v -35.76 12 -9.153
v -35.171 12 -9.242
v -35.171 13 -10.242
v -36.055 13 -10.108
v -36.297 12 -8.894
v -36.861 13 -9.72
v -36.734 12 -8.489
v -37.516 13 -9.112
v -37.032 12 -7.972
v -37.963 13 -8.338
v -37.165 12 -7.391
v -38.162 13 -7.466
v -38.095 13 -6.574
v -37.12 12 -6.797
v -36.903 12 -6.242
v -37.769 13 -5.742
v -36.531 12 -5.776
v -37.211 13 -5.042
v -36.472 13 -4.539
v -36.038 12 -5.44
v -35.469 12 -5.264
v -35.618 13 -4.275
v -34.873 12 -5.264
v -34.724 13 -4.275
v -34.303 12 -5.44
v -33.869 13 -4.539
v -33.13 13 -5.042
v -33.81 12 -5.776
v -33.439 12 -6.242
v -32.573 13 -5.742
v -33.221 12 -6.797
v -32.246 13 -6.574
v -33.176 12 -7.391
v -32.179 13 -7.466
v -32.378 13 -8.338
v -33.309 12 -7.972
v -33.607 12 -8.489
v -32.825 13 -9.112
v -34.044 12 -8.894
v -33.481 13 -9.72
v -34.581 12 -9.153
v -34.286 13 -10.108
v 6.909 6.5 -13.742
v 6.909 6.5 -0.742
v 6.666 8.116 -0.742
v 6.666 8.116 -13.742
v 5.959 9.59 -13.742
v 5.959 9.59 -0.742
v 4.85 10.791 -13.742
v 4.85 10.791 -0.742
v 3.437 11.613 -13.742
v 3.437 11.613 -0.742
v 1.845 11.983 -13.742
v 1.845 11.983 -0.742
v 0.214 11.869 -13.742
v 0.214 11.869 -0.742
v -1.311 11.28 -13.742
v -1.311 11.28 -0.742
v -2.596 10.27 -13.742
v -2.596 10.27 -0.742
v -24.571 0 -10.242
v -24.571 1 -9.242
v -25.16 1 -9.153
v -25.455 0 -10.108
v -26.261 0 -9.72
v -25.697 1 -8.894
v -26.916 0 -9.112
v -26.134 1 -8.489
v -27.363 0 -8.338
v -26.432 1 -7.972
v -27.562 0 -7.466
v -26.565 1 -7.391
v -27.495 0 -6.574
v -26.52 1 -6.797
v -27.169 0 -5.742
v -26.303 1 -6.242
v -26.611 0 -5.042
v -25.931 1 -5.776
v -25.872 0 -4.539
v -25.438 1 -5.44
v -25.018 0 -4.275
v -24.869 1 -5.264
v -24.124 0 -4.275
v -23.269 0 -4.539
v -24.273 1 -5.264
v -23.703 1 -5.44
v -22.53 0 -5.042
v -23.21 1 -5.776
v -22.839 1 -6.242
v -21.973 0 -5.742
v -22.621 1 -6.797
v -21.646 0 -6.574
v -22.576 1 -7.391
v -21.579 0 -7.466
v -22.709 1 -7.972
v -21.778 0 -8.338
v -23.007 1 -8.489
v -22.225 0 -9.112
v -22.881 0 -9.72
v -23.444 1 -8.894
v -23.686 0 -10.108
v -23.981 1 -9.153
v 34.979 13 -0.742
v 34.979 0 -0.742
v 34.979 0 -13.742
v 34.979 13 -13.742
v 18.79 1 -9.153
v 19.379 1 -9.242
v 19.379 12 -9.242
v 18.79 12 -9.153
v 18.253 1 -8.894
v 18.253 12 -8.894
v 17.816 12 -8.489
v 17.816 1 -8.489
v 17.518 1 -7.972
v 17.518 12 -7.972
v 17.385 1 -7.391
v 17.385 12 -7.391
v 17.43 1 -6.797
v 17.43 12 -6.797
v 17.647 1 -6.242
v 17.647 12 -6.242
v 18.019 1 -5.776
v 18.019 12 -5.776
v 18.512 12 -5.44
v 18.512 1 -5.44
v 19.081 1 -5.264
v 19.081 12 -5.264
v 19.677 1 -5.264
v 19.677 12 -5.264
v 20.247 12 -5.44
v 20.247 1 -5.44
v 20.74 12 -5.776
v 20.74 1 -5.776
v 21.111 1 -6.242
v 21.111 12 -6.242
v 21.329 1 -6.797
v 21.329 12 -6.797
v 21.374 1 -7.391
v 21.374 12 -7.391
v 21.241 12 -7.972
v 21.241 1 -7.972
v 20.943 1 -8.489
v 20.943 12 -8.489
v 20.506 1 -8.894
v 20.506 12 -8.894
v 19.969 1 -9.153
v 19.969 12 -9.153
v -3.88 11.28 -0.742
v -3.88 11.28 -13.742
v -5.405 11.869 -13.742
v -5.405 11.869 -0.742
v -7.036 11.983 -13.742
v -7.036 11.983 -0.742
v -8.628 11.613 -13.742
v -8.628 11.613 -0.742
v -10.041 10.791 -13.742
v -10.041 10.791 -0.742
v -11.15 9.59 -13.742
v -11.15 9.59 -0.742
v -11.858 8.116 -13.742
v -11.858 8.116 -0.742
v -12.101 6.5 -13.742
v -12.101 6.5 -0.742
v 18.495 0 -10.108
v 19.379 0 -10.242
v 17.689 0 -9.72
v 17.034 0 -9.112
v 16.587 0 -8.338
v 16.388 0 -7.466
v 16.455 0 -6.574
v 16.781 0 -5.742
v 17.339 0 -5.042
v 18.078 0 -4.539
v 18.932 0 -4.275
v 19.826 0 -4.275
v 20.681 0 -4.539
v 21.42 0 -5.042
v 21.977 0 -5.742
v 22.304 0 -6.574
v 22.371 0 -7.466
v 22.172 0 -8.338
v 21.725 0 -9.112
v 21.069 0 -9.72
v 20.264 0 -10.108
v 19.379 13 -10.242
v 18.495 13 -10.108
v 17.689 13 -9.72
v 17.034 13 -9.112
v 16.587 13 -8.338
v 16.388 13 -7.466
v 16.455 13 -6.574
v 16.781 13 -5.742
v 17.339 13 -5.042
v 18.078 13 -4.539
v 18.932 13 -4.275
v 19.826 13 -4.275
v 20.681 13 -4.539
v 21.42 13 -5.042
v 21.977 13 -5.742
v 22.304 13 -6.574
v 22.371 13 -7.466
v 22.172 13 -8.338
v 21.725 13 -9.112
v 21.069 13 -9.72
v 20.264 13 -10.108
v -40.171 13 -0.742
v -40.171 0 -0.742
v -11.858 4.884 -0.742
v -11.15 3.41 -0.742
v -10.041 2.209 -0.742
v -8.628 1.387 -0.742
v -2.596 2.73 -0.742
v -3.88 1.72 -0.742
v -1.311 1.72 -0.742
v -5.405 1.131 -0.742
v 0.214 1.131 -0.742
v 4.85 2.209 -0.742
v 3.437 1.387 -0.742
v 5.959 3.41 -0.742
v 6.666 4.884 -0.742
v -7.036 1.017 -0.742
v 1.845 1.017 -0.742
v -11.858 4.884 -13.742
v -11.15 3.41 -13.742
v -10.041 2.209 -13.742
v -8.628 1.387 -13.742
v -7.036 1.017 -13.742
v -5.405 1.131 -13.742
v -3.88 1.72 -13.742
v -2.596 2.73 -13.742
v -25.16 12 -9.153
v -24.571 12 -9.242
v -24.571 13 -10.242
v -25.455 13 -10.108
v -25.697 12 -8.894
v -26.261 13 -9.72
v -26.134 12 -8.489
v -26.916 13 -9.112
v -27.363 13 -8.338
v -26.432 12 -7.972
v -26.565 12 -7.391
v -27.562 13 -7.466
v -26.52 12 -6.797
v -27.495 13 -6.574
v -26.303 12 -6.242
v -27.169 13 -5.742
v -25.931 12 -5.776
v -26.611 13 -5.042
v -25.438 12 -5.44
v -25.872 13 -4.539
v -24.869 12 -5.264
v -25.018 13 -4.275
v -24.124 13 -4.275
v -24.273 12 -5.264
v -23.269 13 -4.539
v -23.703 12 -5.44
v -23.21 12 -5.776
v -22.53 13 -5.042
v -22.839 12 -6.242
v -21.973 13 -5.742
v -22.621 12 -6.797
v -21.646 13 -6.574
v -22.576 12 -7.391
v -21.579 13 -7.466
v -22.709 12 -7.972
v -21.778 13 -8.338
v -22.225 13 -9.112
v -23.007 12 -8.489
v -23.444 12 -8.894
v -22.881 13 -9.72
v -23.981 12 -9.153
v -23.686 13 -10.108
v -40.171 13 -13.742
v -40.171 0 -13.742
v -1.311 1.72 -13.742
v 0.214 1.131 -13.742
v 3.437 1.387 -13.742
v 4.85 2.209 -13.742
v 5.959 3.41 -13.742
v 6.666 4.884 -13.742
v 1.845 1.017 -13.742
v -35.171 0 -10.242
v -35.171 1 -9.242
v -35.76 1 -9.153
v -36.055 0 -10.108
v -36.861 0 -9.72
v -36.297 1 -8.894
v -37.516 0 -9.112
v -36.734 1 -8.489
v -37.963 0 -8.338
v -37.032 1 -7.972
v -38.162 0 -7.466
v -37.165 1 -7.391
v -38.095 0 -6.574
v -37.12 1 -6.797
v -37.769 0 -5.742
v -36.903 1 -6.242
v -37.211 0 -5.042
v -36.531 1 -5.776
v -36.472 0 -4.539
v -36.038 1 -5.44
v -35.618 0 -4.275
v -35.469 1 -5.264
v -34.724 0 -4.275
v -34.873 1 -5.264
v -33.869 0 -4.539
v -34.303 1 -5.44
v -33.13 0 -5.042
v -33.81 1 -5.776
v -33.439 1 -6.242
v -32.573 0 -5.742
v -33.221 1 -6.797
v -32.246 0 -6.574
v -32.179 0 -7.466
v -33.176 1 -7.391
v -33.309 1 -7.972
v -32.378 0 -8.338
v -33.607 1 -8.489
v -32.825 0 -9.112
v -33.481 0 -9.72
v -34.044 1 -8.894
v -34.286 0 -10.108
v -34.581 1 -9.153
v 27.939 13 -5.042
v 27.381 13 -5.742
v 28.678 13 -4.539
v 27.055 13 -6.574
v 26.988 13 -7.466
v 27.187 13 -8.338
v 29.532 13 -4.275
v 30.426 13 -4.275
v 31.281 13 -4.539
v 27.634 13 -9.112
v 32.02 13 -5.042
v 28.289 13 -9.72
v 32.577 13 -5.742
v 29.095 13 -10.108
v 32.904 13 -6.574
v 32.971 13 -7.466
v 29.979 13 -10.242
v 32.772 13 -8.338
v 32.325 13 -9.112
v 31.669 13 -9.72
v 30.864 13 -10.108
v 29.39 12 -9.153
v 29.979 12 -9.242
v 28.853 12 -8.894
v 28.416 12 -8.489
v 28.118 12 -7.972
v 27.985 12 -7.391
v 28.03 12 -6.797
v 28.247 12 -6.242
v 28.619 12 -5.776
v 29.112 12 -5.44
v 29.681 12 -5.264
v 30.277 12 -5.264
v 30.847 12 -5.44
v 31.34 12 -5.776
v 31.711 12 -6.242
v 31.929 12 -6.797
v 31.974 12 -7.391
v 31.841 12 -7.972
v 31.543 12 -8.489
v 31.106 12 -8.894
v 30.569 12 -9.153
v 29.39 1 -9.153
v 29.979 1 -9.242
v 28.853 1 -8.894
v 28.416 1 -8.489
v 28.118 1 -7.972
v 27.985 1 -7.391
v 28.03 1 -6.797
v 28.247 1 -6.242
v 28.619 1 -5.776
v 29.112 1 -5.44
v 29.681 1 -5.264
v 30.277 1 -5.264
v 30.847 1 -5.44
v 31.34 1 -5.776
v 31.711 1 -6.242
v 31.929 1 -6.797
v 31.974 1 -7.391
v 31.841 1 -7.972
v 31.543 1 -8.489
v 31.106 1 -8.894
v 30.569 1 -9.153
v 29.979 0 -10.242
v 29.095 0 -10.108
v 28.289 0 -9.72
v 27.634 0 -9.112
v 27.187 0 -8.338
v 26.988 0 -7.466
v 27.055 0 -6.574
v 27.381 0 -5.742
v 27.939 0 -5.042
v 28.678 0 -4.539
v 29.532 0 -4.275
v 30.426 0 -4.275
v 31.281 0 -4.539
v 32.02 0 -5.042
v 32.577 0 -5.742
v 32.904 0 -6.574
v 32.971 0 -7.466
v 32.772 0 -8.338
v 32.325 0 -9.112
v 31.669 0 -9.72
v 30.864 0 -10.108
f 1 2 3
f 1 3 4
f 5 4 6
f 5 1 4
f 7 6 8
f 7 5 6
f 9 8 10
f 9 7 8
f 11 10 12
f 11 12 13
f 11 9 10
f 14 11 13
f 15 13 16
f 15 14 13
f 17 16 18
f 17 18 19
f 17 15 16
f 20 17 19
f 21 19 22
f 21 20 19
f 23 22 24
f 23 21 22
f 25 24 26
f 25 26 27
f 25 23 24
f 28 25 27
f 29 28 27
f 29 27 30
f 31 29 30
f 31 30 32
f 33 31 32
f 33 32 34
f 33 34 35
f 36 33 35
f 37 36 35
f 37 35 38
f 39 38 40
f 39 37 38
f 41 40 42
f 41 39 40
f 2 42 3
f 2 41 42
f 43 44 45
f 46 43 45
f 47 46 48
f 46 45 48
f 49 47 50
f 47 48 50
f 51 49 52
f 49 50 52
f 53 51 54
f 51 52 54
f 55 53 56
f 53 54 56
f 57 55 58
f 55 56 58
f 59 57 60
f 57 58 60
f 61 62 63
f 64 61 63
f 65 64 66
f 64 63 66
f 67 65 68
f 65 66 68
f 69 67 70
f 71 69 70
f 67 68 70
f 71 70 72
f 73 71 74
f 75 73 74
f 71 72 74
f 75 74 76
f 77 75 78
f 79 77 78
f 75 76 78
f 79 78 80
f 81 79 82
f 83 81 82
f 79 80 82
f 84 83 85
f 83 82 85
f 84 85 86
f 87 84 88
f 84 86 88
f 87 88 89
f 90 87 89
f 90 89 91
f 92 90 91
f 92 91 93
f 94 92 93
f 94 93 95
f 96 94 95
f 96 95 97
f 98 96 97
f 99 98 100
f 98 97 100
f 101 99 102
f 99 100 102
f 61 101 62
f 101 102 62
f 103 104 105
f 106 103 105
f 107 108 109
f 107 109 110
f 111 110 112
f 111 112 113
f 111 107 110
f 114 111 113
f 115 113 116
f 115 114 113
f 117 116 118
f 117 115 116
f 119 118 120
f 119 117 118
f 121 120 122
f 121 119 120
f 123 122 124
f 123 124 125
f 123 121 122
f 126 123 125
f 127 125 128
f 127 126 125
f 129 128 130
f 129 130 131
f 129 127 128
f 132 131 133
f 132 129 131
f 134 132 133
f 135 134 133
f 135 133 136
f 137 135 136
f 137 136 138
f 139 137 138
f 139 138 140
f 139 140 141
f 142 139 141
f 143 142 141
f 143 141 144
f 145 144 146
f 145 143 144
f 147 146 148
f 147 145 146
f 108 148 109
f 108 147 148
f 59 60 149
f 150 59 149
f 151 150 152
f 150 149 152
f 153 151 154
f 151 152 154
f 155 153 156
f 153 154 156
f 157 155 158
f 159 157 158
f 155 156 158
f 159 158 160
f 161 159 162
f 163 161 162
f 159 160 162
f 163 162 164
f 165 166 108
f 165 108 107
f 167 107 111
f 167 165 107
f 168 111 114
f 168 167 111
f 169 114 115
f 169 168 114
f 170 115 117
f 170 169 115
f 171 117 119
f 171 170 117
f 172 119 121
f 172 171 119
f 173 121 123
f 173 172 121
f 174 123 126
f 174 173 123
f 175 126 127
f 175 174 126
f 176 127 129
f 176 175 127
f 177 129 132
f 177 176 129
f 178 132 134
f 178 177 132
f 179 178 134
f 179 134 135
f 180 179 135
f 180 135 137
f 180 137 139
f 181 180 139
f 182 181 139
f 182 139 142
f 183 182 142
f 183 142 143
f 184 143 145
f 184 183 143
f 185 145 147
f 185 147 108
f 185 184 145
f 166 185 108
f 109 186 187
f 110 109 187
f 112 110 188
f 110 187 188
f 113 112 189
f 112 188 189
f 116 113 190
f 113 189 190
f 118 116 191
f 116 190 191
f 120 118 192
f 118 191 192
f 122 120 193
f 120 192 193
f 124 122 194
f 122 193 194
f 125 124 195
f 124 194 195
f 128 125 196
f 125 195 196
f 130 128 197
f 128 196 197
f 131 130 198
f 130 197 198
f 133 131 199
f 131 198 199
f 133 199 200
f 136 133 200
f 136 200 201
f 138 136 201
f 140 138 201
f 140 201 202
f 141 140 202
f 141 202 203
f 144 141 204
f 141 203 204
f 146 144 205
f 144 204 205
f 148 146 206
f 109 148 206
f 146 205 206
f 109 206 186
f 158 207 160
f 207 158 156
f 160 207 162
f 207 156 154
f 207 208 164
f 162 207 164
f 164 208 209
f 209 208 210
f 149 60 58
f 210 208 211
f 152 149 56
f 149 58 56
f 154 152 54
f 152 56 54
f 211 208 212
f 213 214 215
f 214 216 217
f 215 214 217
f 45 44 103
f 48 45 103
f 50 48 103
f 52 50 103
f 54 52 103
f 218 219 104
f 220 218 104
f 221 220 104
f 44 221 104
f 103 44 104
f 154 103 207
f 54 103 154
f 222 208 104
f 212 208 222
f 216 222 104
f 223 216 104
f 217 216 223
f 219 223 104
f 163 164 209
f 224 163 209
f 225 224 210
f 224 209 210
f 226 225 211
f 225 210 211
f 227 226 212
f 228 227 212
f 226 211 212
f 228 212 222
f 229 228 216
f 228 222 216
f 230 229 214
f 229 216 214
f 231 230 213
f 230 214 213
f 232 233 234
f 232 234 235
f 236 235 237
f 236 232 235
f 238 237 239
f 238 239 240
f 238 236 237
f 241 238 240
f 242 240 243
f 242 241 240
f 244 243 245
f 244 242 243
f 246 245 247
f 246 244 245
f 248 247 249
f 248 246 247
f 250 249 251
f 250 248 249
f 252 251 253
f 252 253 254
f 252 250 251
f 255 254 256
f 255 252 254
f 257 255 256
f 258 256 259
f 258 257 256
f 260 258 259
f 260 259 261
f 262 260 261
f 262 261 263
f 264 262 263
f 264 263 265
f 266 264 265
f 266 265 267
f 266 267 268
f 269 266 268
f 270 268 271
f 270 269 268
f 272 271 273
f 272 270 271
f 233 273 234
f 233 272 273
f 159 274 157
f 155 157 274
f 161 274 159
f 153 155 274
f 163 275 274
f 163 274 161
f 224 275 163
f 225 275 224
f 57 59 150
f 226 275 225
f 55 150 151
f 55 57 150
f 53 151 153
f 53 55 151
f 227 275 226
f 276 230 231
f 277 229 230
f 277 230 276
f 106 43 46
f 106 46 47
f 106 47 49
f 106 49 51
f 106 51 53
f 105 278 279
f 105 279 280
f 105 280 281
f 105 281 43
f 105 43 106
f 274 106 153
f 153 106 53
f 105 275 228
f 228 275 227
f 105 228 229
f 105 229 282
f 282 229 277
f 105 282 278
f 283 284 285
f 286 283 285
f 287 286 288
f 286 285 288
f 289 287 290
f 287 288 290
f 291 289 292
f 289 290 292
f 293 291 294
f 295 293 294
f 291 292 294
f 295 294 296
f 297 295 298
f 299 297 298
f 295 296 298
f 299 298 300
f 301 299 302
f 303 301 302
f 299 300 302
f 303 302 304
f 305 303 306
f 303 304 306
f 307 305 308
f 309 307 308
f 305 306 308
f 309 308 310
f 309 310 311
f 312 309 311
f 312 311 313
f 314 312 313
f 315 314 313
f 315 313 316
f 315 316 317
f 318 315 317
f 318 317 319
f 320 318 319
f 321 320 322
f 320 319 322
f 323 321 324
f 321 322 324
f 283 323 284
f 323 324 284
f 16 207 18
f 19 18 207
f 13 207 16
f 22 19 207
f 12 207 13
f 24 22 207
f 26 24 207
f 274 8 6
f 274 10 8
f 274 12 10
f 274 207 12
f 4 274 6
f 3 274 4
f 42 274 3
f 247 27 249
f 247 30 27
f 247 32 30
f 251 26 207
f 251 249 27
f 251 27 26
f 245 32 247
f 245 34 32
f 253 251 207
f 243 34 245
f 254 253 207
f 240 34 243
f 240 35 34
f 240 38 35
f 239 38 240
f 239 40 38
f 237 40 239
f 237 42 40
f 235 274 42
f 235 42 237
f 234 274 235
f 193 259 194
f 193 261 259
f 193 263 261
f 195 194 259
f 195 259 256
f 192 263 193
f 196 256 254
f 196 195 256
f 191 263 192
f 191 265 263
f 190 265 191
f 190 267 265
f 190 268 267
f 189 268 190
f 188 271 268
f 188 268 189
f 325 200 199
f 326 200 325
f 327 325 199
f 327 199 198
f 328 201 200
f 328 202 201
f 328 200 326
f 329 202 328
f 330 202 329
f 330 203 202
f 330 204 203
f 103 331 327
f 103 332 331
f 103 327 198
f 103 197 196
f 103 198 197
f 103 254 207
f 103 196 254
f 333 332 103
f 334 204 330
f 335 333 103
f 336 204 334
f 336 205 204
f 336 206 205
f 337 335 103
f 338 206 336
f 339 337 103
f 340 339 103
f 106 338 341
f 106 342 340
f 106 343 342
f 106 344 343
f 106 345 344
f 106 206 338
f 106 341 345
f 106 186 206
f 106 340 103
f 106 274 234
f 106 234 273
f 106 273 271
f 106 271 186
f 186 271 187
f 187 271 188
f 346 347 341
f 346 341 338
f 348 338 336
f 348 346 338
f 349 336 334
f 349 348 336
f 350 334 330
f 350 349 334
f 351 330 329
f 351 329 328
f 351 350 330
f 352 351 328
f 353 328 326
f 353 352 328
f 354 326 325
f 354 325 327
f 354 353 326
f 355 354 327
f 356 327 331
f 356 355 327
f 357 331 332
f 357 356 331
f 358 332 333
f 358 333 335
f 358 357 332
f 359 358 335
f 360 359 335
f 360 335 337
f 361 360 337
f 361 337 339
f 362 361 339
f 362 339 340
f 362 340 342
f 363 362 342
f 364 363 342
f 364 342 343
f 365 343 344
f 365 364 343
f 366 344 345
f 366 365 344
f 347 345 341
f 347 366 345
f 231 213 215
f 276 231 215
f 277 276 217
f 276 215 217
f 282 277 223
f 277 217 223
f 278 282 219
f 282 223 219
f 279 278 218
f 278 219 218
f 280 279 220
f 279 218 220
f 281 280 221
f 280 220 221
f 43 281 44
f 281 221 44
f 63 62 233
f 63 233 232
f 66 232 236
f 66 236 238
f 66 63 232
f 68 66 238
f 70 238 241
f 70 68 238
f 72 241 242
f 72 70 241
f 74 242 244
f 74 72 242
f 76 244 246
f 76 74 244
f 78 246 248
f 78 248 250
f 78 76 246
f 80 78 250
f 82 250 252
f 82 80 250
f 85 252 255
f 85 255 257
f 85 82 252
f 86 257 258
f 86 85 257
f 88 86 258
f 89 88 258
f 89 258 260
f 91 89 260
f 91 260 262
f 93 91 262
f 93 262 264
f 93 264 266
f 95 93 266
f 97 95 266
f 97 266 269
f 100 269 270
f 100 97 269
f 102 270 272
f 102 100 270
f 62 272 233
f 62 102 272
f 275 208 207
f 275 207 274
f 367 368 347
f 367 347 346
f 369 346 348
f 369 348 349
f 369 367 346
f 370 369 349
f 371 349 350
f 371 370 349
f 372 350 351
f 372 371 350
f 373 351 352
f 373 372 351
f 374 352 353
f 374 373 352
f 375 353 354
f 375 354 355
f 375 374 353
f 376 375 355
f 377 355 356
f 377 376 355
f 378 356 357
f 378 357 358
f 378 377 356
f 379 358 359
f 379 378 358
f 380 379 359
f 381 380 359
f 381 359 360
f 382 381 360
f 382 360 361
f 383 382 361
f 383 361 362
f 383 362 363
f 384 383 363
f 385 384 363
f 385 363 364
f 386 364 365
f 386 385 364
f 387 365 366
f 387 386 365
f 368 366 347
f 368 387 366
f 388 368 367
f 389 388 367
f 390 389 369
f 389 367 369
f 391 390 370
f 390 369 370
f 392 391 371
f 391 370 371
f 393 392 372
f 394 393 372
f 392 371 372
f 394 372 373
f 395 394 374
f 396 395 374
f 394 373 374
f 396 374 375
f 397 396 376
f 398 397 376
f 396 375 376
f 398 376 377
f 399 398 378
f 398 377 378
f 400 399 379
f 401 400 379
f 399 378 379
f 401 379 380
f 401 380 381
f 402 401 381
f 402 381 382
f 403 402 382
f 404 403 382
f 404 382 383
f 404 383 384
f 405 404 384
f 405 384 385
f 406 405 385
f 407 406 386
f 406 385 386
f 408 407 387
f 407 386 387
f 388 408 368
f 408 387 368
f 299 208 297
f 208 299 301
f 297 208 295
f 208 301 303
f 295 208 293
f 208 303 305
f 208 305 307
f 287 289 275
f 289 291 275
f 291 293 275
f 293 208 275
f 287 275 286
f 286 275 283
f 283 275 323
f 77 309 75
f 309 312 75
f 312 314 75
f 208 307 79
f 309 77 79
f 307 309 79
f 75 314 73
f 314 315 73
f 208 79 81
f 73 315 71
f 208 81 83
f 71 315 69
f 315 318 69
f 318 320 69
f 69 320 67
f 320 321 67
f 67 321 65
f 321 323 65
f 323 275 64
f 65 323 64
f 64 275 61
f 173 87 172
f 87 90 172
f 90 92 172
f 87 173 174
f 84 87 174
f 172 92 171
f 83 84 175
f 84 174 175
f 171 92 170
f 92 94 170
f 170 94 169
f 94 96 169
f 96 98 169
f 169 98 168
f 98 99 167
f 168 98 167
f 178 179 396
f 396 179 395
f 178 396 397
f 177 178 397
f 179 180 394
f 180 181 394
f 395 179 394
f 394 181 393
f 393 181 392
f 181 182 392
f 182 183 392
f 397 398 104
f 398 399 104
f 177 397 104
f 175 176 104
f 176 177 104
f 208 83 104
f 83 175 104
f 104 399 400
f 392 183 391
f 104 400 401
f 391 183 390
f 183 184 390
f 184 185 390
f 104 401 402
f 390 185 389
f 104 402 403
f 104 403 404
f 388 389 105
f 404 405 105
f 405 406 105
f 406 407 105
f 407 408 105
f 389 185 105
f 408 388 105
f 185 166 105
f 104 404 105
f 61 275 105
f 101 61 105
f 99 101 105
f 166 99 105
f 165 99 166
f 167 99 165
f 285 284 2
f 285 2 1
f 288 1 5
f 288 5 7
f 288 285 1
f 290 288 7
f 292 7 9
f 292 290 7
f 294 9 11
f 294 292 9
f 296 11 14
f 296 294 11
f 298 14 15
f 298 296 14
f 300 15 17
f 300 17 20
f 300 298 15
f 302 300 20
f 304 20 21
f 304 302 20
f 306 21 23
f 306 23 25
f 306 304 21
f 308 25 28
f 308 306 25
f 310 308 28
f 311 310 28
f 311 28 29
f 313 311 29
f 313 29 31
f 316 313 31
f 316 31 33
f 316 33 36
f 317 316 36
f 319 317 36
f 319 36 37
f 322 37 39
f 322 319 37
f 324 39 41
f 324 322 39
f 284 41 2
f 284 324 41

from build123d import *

# Parameters (mm, degrees)
SKETCH1_W           = 75.15
SKETCH1_H           = 13
SKETCH1_R           = 2
BOSS_EXTRUDE1_DEPTH = 13
CHAMFER1_SIZE       = 1
CHAMFER2_SIZE       = 1
CUT_EXTRUDE1_DEPTH  = 13


with BuildPart() as part:
    # Sketch1 → Boss-Extrude1 (new body)
    with BuildSketch(Plane(origin=(0, 0, 0), x_dir=(1, 0, 0), z_dir=(0, 1, 0))):
        with Locations((-2.595641447, 7.241611842)):
            Rectangle(SKETCH1_W, SKETCH1_H)
        with Locations(Location((29.979358553, 7.241611842, 0), (0, 0, 90))):
            Circle(SKETCH1_R, mode=Mode.SUBTRACT)
        with Locations(Location((19.379358553, 7.241611842, 0), (0, 0, 90))):
            Circle(SKETCH1_R, mode=Mode.SUBTRACT)
        with Locations(Location((-35.170641447, 7.241611842, 0), (0, 0, 90))):
            Circle(SKETCH1_R, mode=Mode.SUBTRACT)
        with Locations(Location((-24.570641447, 7.241611842, 0), (0, 0, 90))):
            Circle(SKETCH1_R, mode=Mode.SUBTRACT)
    extrude(amount=BOSS_EXTRUDE1_DEPTH)

    # Chamfer1
    chamfer1_edges = [part.edges().sort_by_distance(p)[0] for p in [
        (19.379358553, 0, -5.241611842),
    ]]
    chamfer(chamfer1_edges, length=CHAMFER1_SIZE)

    # Chamfer2
    chamfer2_edges = [part.edges().sort_by_distance(p)[0] for p in [
        (29.979358553, 0, -5.241611842),
        (29.979358553, 13, -5.241611842),
        (19.379358553, 13, -5.241611842),
        (-35.170641447, 0, -5.241611842),
        (-35.170641447, 13, -5.241611842),
        (-24.570641447, 0, -5.241611842),
        (-24.570641447, 13, -5.241611842),
    ]]
    chamfer(chamfer2_edges, length=CHAMFER2_SIZE)

    # Sketch2 → Cut-Extrude1 (cut)
    with BuildSketch(Plane.XY.offset(-0.741611842)):
        with BuildLine():
            ThreePointArc((-2.595641447, 10.269612049), (-1.48803448, 8.52762176), (-1.100641447, 6.5))
            Line((-1.100641447, 6.5), (6.909358553, 6.5))
            ThreePointArc((6.909358553, 6.5), (3.436980312, 11.612606967), (-2.595641447, 10.269612049))
        make_face()
        with BuildLine():
            ThreePointArc((-2.595641447, 2.730387951), (-1.48803448, 4.47237824), (-1.100641447, 6.5))
            Line((-1.100641447, 6.5), (-4.090641447, 6.5))
            ThreePointArc((-4.090641447, 6.5), (-3.703248414, 4.47237824), (-2.595641447, 2.730387951))
        make_face()
        with BuildLine():
            Line((-4.090641447, 6.5), (-1.100641447, 6.5))
            ThreePointArc((-1.100641447, 6.5), (-1.48803448, 8.52762176), (-2.595641447, 10.269612049))
            ThreePointArc((-2.595641447, 10.269612049), (-3.703248414, 8.52762176), (-4.090641447, 6.5))
        make_face()
        with BuildLine():
            Line((6.909358553, 6.5), (-1.100641447, 6.5))
            ThreePointArc((-1.100641447, 6.5), (-1.48803448, 4.47237824), (-2.595641447, 2.730387951))
            ThreePointArc((-2.595641447, 2.730387951), (3.436980312, 1.387393033), (6.909358553, 6.5))
        make_face()
        with BuildLine():
            ThreePointArc((-2.595641447, 2.730387951), (-3.703248414, 4.47237824), (-4.090641447, 6.5))
            Line((-4.090641447, 6.5), (-12.100641447, 6.5))
            ThreePointArc((-12.100641447, 6.5), (-8.628263207, 1.387393033), (-2.595641447, 2.730387951))
        make_face()
        with BuildLine():
            Line((-12.100641447, 6.5), (-4.090641447, 6.5))
            ThreePointArc((-4.090641447, 6.5), (-3.703248414, 8.52762176), (-2.595641447, 10.269612049))
            ThreePointArc((-2.595641447, 10.269612049), (-8.628263207, 11.612606967), (-12.100641447, 6.5))
        make_face()
    extrude(amount=-CUT_EXTRUDE1_DEPTH, mode=Mode.SUBTRACT)


solid = part.part
